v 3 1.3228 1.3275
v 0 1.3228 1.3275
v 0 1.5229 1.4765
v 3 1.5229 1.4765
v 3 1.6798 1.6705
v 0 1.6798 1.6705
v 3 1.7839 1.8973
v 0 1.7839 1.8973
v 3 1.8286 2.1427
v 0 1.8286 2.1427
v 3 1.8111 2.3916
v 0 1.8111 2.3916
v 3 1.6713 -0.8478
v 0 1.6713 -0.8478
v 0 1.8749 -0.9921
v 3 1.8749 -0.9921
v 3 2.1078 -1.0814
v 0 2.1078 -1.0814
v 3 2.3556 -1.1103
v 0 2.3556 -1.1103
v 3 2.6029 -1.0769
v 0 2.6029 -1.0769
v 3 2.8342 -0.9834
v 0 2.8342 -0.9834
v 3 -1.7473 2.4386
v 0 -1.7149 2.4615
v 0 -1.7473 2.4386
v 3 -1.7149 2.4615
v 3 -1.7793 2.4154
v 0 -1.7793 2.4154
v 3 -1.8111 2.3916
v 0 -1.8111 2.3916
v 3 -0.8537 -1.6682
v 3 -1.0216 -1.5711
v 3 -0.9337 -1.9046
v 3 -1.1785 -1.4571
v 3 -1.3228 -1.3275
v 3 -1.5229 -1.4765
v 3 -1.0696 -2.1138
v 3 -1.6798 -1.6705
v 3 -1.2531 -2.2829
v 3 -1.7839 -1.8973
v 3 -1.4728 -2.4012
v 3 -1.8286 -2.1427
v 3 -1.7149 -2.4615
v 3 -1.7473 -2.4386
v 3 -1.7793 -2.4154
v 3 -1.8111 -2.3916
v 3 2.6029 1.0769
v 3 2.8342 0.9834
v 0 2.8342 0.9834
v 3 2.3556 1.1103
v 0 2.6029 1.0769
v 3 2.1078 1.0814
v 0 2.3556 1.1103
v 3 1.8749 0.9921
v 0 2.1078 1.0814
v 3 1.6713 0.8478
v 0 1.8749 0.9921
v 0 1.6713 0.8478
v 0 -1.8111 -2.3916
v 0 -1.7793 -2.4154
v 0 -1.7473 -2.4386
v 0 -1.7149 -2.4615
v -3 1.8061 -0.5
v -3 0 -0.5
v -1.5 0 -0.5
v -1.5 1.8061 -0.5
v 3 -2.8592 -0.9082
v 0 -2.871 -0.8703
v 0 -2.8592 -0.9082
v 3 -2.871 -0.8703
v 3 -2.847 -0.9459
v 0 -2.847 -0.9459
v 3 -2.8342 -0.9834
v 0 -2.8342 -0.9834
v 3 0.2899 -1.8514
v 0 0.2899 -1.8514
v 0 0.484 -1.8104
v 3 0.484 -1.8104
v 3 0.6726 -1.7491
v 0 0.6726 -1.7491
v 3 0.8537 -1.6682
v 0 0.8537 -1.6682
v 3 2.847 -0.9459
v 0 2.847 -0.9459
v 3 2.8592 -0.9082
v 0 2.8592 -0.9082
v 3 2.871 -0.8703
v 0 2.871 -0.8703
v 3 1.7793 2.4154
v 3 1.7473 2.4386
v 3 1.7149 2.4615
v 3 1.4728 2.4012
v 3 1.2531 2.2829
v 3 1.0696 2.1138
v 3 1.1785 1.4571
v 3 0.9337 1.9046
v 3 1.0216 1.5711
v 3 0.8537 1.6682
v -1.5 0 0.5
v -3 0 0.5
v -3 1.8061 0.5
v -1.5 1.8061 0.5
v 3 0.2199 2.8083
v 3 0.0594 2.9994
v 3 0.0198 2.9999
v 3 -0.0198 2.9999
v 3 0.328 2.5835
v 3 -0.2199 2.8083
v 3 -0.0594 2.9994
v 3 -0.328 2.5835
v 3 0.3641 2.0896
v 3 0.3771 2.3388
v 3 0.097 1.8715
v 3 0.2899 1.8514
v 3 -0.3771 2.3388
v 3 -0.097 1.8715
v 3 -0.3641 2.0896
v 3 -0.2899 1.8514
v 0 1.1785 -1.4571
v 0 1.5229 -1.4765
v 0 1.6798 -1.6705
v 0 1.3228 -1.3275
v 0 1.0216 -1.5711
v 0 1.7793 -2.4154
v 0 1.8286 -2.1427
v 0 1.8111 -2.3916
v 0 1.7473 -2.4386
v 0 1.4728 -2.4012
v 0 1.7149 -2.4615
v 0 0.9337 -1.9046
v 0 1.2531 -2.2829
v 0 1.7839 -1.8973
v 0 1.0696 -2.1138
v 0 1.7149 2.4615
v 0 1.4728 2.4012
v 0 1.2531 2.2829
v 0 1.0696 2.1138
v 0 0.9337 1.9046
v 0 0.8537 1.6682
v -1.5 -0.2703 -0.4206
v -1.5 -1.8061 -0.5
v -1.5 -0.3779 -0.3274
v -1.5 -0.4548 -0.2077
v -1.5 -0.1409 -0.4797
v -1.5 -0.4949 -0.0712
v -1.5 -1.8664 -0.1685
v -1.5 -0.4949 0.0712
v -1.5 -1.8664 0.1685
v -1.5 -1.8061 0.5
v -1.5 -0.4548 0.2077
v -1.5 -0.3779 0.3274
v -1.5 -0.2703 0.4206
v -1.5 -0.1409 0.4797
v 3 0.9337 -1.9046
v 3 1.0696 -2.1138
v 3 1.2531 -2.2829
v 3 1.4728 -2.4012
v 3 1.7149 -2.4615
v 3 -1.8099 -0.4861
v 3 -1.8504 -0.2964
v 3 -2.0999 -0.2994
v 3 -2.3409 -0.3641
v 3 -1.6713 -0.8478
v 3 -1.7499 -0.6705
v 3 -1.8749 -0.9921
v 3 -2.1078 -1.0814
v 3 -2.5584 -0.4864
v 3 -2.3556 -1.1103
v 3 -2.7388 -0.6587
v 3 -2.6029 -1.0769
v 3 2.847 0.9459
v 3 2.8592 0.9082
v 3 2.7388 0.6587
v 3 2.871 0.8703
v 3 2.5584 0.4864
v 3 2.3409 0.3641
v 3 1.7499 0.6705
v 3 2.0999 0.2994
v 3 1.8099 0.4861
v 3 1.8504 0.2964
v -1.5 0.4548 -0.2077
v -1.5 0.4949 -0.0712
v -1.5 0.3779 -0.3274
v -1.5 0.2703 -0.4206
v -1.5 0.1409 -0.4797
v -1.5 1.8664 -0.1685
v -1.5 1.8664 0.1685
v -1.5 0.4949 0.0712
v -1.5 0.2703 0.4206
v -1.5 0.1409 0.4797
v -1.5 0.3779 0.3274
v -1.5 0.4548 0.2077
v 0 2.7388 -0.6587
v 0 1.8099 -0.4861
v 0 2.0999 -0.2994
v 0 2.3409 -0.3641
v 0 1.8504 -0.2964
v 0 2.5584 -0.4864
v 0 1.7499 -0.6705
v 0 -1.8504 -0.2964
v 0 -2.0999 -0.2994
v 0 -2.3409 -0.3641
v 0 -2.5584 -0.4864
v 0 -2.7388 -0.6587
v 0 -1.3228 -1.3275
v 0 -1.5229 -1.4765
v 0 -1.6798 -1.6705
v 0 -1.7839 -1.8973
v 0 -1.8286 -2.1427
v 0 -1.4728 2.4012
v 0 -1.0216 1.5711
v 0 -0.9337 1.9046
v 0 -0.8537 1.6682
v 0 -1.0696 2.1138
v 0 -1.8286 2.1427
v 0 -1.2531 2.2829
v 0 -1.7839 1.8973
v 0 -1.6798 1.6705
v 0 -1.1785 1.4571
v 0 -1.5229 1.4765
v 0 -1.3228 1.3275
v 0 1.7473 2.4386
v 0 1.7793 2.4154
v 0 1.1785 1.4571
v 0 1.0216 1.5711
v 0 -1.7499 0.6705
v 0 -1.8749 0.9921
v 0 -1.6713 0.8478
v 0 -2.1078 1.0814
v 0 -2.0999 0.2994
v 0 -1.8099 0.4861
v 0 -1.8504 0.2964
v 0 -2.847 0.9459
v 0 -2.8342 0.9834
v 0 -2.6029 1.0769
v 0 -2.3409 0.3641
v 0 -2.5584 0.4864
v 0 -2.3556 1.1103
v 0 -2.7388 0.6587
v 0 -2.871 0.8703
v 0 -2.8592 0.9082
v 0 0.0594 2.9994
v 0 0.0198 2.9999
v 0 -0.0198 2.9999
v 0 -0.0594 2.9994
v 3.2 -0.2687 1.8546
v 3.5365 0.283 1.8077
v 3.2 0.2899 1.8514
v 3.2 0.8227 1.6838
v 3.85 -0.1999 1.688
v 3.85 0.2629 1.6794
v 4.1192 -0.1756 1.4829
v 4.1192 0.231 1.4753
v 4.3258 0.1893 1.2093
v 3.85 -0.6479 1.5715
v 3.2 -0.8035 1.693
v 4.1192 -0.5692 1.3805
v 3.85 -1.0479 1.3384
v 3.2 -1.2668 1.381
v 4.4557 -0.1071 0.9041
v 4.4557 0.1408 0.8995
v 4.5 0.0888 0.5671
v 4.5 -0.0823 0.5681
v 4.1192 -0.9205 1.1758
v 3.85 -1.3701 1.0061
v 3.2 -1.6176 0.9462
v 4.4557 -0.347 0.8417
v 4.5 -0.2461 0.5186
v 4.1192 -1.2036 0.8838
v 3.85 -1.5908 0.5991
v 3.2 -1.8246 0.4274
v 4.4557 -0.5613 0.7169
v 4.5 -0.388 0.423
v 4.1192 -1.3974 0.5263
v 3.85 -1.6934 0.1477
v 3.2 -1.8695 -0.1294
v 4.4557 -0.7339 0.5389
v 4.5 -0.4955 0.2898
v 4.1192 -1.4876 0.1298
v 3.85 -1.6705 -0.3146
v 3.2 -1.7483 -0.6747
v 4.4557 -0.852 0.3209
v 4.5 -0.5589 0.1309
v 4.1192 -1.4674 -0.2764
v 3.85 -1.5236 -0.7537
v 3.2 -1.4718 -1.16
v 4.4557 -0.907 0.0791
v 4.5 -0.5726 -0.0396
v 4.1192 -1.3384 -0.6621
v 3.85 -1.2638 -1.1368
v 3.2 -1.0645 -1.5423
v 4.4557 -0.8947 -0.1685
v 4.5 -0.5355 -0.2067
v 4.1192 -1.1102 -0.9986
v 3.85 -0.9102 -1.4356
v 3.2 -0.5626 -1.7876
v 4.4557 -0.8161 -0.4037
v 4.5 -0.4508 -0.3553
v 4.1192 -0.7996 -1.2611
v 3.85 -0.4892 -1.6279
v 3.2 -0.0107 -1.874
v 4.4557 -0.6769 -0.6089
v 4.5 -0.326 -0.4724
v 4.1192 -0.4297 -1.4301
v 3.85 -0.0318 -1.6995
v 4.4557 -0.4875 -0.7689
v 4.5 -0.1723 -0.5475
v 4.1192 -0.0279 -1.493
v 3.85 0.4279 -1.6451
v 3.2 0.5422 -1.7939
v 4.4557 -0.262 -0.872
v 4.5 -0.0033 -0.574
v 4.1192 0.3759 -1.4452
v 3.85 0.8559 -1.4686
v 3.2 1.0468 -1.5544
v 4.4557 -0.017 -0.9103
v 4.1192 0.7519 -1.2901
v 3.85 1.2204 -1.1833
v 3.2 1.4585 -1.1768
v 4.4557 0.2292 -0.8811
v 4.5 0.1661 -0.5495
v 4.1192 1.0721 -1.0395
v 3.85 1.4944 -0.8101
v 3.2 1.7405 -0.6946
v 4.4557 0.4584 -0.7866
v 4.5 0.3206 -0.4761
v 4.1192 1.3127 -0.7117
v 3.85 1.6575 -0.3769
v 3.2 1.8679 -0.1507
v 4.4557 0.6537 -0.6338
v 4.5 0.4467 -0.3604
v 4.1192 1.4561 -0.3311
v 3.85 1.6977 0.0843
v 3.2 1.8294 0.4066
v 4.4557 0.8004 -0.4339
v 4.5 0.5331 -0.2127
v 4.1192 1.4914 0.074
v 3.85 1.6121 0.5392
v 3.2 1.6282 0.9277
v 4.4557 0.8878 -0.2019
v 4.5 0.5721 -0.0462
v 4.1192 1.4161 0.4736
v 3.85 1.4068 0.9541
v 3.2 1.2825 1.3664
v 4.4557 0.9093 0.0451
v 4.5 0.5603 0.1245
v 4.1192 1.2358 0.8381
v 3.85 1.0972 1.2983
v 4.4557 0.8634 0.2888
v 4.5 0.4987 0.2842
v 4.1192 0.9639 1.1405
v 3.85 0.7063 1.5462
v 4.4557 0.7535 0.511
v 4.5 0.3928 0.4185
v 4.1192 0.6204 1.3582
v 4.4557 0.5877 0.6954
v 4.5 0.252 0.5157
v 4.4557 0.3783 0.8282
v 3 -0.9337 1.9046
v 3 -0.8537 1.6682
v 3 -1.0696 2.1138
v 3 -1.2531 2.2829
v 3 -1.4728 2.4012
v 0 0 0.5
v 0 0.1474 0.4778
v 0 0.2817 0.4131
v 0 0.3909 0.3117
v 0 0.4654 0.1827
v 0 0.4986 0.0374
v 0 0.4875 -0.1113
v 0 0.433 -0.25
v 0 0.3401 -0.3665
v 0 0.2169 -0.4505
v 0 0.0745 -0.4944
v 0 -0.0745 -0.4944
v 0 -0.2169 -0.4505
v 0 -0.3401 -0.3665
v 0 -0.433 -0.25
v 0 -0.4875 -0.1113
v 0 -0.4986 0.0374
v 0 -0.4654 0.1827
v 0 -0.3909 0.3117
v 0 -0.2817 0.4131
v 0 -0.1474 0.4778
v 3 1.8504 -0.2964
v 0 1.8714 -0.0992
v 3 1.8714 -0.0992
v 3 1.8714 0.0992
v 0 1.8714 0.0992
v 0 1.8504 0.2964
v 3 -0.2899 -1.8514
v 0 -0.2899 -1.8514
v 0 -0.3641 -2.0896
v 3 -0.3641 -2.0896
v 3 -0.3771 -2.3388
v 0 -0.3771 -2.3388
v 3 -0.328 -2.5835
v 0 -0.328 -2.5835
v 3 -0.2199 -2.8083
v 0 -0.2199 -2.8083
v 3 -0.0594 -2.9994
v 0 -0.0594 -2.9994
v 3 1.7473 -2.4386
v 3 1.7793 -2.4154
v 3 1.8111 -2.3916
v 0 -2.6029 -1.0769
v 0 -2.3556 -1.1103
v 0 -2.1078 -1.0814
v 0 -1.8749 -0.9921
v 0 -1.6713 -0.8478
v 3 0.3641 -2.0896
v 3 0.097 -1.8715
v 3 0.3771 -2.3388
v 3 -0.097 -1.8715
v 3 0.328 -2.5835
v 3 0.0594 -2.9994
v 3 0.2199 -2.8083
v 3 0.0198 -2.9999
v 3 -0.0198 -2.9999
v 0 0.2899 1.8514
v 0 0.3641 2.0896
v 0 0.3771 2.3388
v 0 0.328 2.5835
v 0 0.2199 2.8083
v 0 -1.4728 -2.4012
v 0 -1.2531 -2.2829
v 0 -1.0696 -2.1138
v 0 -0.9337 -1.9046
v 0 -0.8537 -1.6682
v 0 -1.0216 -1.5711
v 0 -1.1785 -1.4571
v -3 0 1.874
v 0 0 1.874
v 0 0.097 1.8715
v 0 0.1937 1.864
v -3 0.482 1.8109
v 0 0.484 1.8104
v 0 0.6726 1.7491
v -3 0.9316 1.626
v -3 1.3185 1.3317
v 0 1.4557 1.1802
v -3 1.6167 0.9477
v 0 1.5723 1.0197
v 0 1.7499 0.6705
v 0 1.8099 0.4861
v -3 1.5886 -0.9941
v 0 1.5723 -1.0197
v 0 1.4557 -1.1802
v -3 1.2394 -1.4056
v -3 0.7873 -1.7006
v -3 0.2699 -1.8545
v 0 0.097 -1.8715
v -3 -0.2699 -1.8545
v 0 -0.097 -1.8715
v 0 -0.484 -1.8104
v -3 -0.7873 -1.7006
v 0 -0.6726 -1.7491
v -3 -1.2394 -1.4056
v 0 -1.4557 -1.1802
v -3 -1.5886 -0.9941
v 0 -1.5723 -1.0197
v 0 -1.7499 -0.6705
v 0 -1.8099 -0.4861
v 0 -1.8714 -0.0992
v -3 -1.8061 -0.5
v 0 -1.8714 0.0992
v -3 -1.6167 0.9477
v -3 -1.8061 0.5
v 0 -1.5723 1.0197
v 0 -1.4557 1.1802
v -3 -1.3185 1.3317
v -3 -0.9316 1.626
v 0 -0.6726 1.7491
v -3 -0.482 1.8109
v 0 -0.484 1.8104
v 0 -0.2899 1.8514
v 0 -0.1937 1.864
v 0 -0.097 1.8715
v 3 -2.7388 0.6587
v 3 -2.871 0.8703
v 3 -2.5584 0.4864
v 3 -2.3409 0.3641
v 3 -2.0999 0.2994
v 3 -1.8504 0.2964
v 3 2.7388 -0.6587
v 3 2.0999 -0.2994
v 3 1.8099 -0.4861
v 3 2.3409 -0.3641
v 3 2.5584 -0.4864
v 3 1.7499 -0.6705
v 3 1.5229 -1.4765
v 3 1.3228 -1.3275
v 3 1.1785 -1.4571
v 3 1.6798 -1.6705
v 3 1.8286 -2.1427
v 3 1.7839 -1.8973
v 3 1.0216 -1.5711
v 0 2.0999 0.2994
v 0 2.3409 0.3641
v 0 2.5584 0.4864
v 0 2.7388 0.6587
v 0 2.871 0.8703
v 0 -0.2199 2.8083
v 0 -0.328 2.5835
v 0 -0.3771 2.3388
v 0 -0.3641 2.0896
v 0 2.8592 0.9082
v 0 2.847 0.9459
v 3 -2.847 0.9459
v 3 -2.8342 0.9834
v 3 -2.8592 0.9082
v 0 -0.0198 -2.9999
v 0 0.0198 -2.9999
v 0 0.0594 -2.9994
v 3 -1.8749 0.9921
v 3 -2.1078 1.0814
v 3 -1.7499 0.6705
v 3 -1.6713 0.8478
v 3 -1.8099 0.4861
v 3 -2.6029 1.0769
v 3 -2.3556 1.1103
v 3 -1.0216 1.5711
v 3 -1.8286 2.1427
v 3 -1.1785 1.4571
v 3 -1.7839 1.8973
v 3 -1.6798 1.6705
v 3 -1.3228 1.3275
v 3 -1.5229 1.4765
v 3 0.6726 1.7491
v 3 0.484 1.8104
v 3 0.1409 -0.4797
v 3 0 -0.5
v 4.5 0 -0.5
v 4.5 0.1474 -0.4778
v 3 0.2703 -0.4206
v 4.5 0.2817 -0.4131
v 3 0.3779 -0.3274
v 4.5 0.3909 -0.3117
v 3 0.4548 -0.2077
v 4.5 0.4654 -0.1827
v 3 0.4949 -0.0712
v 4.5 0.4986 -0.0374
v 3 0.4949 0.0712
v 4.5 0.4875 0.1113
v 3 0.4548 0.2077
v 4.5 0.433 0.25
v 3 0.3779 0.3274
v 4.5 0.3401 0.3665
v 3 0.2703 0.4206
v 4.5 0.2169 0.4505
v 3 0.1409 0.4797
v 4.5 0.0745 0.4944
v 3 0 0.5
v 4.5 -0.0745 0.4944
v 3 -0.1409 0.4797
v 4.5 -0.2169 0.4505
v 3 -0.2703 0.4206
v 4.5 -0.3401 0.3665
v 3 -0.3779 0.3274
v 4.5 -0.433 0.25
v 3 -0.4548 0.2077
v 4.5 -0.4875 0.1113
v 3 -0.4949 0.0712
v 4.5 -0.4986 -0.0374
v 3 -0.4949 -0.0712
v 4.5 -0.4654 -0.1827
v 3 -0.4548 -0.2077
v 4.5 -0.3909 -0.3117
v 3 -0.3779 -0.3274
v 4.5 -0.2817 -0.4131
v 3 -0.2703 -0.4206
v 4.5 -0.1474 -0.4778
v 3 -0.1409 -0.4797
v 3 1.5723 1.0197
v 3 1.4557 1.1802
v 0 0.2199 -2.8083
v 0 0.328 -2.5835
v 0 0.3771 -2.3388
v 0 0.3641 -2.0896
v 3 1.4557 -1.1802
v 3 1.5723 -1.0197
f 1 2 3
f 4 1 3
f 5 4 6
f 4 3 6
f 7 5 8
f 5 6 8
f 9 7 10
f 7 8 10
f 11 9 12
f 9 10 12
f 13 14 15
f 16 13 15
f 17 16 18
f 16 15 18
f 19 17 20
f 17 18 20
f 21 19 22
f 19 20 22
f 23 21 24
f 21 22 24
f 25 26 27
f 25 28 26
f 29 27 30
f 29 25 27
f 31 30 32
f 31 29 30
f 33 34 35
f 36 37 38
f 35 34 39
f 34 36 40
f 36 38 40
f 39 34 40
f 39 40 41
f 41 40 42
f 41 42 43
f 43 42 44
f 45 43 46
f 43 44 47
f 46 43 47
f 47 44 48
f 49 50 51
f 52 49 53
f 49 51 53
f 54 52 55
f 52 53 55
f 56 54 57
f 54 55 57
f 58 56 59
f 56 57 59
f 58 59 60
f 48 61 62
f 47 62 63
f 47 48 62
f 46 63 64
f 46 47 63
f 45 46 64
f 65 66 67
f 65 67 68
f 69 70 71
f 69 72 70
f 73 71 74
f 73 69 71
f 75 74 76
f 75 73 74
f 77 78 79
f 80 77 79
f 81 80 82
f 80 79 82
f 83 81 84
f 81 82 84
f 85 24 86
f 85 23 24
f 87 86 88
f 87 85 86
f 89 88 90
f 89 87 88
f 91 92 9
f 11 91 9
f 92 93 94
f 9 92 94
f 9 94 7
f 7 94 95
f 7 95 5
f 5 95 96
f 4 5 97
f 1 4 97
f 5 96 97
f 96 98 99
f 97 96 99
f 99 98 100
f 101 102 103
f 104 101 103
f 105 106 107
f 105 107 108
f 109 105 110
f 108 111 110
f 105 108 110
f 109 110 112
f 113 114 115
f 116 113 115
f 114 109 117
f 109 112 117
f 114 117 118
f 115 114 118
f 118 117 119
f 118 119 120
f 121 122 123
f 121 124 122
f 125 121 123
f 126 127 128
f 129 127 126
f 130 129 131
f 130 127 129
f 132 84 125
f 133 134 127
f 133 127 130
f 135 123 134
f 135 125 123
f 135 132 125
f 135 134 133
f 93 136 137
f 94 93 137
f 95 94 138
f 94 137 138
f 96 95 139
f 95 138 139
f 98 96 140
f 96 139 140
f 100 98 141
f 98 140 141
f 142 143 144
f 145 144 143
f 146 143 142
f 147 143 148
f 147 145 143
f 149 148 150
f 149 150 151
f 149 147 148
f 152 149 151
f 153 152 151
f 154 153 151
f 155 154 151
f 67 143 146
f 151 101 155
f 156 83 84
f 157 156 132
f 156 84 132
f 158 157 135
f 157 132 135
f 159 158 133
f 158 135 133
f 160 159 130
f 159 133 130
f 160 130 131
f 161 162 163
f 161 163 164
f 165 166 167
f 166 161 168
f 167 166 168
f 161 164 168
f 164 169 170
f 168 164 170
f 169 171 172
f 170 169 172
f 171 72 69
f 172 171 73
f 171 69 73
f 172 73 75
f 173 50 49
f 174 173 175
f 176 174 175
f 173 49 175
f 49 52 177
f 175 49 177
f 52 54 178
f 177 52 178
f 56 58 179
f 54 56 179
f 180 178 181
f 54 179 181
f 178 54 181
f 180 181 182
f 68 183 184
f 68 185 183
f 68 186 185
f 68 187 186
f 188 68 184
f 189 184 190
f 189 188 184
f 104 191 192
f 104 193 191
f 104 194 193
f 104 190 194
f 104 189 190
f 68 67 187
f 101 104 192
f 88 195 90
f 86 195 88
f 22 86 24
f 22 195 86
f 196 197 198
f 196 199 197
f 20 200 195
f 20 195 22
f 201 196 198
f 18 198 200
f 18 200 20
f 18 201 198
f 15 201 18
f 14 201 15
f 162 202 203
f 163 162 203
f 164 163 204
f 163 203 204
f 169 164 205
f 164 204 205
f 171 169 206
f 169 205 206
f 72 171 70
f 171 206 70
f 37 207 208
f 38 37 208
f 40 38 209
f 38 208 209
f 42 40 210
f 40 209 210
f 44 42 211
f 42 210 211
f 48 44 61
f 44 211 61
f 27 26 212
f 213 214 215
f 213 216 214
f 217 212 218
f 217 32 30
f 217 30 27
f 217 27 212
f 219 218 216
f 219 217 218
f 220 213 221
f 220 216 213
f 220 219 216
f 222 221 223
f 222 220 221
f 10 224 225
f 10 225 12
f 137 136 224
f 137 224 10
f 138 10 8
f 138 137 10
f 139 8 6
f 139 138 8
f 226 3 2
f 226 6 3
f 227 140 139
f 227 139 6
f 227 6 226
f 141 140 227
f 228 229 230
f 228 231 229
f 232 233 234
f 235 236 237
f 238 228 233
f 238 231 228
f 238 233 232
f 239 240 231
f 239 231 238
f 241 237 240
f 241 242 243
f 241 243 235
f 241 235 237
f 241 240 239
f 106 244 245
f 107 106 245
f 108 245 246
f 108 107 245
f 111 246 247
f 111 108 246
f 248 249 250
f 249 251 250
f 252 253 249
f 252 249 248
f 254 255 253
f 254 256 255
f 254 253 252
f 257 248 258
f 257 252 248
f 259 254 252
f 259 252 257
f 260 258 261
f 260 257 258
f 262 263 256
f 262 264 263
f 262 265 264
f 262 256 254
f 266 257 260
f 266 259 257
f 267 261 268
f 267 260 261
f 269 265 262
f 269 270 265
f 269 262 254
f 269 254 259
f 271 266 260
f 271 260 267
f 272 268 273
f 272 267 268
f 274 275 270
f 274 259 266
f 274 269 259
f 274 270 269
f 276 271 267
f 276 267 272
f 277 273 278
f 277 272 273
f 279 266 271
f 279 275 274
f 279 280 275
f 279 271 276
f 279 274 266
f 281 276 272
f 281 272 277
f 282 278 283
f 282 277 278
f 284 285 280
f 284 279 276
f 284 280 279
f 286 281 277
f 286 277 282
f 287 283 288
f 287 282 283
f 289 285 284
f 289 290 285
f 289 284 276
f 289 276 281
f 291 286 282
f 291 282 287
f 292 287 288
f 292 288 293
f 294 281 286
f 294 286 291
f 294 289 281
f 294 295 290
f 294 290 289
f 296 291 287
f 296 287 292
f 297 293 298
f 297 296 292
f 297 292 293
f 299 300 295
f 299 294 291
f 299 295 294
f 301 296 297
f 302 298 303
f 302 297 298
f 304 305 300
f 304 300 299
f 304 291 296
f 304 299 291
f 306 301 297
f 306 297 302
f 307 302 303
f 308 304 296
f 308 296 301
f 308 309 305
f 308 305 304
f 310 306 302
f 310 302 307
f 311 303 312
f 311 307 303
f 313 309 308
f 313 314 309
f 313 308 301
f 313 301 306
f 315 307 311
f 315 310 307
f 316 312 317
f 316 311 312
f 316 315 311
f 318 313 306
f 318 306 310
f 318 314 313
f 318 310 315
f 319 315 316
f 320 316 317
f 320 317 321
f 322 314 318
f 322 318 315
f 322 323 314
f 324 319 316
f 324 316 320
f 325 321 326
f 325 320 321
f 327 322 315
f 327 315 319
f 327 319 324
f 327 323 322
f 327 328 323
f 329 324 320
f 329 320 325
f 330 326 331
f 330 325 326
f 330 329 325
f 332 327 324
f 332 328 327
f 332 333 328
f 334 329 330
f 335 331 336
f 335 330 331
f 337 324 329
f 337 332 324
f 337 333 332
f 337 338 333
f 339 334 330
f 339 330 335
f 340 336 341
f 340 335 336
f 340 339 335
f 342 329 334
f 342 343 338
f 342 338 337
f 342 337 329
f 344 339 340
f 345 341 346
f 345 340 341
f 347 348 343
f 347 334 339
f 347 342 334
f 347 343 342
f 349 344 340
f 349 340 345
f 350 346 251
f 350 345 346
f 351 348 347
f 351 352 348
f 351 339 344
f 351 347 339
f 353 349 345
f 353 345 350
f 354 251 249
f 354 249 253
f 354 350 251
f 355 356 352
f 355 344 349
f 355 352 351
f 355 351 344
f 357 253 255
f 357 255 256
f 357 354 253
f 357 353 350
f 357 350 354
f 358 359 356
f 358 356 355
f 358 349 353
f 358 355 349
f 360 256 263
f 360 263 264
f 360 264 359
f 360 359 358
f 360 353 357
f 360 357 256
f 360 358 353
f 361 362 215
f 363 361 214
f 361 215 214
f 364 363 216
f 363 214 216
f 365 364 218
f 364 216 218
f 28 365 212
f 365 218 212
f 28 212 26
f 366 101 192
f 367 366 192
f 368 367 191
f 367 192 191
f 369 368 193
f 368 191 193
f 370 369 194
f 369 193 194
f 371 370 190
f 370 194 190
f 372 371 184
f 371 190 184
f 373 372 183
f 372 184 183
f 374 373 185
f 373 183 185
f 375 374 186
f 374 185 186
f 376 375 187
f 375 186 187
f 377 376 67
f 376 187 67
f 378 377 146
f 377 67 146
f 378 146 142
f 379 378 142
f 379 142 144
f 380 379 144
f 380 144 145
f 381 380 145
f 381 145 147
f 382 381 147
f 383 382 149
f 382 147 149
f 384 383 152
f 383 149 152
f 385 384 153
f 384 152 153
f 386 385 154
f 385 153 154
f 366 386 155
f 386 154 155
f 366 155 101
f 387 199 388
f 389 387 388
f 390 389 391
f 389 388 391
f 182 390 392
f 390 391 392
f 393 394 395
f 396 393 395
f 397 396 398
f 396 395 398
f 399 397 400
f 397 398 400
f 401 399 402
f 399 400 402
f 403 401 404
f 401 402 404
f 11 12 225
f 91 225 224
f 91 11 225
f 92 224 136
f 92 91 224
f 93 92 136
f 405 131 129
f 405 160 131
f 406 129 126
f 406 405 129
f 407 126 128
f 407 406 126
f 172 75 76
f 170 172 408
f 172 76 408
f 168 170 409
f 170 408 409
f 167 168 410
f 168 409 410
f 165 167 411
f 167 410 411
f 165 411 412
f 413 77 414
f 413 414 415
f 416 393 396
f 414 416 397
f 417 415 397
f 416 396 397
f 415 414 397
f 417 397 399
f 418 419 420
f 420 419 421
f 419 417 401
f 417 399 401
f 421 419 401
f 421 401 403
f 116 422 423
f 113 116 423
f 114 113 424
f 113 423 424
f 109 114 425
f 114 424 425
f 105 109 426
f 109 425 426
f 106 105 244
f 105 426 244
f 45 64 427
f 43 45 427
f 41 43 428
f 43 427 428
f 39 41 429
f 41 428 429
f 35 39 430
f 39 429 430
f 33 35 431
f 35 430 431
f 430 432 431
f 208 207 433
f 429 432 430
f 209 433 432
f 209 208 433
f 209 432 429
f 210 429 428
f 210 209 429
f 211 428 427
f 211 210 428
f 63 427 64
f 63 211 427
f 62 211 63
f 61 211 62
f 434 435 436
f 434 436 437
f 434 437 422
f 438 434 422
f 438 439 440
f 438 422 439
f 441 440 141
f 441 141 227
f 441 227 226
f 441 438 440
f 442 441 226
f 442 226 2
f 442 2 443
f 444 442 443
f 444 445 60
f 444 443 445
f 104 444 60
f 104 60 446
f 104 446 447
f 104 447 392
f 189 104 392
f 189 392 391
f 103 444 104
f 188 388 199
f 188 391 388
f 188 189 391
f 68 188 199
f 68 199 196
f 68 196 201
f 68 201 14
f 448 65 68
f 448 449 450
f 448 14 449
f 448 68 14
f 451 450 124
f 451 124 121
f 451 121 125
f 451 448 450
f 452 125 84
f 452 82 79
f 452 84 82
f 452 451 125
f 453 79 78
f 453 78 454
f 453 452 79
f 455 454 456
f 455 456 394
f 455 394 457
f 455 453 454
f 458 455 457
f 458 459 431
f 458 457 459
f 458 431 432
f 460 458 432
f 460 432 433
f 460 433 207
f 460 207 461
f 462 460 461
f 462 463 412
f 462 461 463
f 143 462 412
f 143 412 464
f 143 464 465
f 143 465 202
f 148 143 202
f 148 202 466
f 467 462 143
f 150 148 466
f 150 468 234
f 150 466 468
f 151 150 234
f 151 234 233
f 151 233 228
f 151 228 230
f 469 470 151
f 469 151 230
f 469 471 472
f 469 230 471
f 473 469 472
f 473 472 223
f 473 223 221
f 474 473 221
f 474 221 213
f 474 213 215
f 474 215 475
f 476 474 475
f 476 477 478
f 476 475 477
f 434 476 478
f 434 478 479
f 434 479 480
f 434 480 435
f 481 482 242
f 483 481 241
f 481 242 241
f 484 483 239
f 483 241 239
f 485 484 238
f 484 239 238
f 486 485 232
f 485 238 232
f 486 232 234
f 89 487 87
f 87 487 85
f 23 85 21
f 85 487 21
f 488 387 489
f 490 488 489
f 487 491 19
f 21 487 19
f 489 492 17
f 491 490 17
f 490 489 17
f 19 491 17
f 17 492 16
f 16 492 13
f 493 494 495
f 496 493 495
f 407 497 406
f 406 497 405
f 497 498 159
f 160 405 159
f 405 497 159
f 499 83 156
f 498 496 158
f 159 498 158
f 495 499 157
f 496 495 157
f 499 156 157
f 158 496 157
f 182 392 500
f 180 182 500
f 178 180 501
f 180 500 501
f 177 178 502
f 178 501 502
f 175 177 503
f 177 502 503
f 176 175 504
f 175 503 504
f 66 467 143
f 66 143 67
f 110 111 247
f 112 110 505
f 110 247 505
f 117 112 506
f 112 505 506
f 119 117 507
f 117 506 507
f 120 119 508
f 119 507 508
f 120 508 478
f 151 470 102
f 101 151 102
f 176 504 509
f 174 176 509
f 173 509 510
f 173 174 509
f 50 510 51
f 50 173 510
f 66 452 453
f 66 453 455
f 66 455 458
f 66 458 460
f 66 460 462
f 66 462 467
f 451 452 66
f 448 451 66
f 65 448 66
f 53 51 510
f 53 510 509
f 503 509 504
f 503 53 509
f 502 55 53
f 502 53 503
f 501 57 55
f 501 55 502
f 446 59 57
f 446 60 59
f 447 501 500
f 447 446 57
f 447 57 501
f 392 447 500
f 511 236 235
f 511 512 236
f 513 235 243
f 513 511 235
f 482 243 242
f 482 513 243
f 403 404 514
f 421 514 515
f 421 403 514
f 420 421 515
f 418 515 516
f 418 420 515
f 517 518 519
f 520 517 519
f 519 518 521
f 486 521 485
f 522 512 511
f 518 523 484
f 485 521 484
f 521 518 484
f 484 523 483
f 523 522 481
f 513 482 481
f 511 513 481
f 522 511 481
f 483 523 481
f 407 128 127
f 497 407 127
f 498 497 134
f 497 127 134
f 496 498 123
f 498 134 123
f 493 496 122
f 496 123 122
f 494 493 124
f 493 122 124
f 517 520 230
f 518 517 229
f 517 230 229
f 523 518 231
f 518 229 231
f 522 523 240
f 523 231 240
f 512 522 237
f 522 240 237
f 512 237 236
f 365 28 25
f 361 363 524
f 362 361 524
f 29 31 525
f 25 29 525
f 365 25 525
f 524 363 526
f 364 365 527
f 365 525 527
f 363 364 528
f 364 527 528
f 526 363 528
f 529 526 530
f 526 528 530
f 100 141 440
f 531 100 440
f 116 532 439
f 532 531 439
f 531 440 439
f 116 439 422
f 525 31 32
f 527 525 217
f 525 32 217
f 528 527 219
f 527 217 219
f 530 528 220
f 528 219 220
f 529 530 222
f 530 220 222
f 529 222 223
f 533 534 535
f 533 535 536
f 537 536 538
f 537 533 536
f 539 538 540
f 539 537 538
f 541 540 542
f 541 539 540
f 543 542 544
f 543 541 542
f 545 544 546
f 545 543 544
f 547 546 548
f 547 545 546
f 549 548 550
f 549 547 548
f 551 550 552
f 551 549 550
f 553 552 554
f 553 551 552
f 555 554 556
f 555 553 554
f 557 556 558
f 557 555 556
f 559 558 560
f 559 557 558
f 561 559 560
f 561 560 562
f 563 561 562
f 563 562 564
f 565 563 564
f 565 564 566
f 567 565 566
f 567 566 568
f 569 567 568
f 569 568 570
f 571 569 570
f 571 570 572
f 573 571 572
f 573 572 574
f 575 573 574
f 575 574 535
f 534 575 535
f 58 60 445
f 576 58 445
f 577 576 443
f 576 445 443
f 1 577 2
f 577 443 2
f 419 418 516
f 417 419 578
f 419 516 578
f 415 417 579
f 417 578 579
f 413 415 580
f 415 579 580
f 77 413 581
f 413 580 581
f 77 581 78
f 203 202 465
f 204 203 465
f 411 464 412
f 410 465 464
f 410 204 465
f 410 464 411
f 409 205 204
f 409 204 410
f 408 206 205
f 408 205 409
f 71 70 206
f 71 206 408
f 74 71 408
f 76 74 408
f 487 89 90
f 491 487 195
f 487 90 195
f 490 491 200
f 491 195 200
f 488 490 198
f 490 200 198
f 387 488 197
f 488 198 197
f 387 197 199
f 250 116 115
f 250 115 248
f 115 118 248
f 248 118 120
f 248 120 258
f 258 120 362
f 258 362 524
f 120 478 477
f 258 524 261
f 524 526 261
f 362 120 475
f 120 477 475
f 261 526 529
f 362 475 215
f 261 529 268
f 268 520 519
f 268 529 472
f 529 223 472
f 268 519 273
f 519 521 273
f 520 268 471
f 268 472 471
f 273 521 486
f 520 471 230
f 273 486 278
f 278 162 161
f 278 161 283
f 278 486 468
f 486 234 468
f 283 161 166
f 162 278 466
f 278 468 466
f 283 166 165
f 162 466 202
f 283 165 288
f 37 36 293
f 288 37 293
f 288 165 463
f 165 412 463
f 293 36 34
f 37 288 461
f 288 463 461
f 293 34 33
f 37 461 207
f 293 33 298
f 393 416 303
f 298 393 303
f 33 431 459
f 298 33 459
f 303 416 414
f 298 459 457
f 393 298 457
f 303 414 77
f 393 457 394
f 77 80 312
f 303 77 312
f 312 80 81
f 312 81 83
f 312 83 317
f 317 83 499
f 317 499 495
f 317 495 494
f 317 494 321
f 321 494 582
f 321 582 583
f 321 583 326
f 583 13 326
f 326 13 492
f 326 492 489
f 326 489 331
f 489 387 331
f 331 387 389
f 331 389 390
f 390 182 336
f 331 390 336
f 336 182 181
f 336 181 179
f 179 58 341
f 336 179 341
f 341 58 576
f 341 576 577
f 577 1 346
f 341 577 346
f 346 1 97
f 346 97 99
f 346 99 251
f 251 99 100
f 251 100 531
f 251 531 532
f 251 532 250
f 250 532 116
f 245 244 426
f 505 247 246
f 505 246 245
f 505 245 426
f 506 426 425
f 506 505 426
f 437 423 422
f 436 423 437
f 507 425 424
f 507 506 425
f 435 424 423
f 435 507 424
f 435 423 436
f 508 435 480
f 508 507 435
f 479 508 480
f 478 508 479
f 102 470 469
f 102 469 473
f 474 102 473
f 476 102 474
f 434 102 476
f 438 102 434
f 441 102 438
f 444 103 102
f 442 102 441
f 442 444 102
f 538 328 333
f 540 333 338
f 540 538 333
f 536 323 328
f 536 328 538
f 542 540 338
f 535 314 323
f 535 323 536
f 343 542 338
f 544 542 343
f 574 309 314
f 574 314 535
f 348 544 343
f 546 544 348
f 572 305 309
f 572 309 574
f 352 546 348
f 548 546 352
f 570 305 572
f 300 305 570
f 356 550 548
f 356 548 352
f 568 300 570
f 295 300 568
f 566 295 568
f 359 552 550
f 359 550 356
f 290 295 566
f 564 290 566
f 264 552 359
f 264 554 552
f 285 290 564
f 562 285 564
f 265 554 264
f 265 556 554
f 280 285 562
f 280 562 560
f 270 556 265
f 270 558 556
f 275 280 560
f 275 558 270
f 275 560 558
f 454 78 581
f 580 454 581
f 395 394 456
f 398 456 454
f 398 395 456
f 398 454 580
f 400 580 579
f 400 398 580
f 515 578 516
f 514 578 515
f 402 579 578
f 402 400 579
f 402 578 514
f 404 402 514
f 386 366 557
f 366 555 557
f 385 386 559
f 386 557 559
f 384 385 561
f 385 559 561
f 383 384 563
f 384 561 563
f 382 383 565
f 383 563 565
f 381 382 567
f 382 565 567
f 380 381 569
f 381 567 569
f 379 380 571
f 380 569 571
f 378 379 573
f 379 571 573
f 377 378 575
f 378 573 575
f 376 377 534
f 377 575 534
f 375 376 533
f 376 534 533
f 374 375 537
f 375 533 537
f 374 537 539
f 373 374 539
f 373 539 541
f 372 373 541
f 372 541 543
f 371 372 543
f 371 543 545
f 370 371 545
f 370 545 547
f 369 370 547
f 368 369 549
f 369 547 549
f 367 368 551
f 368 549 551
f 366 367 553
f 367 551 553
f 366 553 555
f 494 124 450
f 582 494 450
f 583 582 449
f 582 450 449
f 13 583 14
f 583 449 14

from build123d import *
from build123d.topology import SkipClean

# Parameters (mm, degrees)
BASPROSKE_W         = 3
BASPROSKE_H         = 3
TOOTHCUT_DEPTH      = 6.196152423
TEETHCUTS_COUNT     = 10
TEETHCUTS_ANGLE     = 324
BORSKE_R            = 0.5
BORE_DEPTH          = 50.0000508
SKETCH_1_R          = 1.874
SKETCH_1_R_2        = 0.5
EXTRUDE_1_DEPTH     = 1.5
FILLET_2_R          = 1.3
EXTRUDE_START       = 3
SKETCH_2_R          = 1.874
SKETCH_2_R_2        = 0.5
EXTRUDE_2_DEPTH     = 3
SKETCH_3_W          = 1
SKETCH_3_H          = 3.761306816
CUT_EXTRUDE_1_DEPTH = 1.5


with BuildPart() as part:
    # BasProSke → Base-Revolve (revolve)
    with BuildSketch(Plane(origin=(0, 0, 0), x_dir=(1, 0, 0), z_dir=(0, 1, 0)), mode=Mode.PRIVATE) as base_revolve_sk:
        with Locations((1.5, 1.5)):
            Rectangle(BASPROSKE_W, BASPROSKE_H)
    revolve(base_revolve_sk.sketch.rotate(Axis((-10, 0, 0), (1, 0, 0)), 180), axis=Axis((-10, 0, 0), (1, 0, 0)))

    # TooCutSke → ToothCut (cut, through all)
    with BuildSketch(Plane(origin=(0, 0, 0), x_dir=(0, 0, -1), z_dir=(1, 0, 0))):
        with BuildLine():
            ThreePointArc((0.296449938, 1.850403587), (0, 1.874), (-0.296449938, 1.850403587))
            ThreePointArc((-0.296449938, 1.850403587), (-0.428089565, 2.470295585), (-0.905889751, 2.886591228))
            ThreePointArc((-0.905889751, 2.886591228), (0, 3.0254), (0.905889751, 2.886591228))
            ThreePointArc((0.905889751, 2.886591228), (0.428089565, 2.470295585), (0.296449938, 1.850403587))
        make_face()
    toothcut = extrude(amount=TOOTHCUT_DEPTH, mode=Mode.SUBTRACT)

    # TeethCuts: ToothCut ×10 about axis
    teethcuts_axis = Axis((-10, 0, 0), (1, 0, 0))
    for i in range(1, TEETHCUTS_COUNT):
        add(toothcut.rotate(teethcuts_axis, i * TEETHCUTS_ANGLE / (TEETHCUTS_COUNT - 1)), mode=Mode.SUBTRACT)

    # BorSke → Bore (cut, symmetric)
    with BuildSketch(Plane(origin=(0, 0, 0), x_dir=(0, 0, -1), z_dir=(1, 0, 0))):
        with Locations(Location((0, 0, 0), (0, 0, 180))):
            Circle(BORSKE_R)
    extrude(amount=BORE_DEPTH, both=True, mode=Mode.SUBTRACT)

    # 草图1 → 凸台-拉伸1 (add)
    with SkipClean():  # the faces are left unmerged after this step: merging them gives an invalid solid
        with BuildSketch(Plane(origin=(3, 0, 0), x_dir=(0, 0, -1), z_dir=(1, 0, 0))):
            with Locations(Location((0, 0, 0), (0, 0, 171.101911086))):
                Circle(SKETCH_1_R)
            Circle(SKETCH_1_R_2, mode=Mode.SUBTRACT)
        extrude(amount=EXTRUDE_1_DEPTH)
    add(part.part.scale(1), mode=Mode.REPLACE)  # the faces are merged on a copy

    # 圆角2
    fillet_2_edges = [part.edges().sort_by_distance(p)[0] for p in [
        (4.5, -0.28986551, -1.851446458),
    ]]
    fillet(fillet_2_edges, radius=FILLET_2_R)

    # 草图2 → 凸台-拉伸2 (add)
    with BuildSketch(Plane.ZY.offset(EXTRUDE_START)):
        Circle(SKETCH_2_R)
        Circle(SKETCH_2_R_2, mode=Mode.SUBTRACT)
    extrude(amount=-EXTRUDE_2_DEPTH)

    # 草图3 → 切除-拉伸1 (cut)
    with BuildSketch(Plane.ZY.offset(3)):
        Rectangle(SKETCH_3_W, SKETCH_3_H)
    extrude(amount=-CUT_EXTRUDE_1_DEPTH, mode=Mode.SUBTRACT)


solid = part.part
